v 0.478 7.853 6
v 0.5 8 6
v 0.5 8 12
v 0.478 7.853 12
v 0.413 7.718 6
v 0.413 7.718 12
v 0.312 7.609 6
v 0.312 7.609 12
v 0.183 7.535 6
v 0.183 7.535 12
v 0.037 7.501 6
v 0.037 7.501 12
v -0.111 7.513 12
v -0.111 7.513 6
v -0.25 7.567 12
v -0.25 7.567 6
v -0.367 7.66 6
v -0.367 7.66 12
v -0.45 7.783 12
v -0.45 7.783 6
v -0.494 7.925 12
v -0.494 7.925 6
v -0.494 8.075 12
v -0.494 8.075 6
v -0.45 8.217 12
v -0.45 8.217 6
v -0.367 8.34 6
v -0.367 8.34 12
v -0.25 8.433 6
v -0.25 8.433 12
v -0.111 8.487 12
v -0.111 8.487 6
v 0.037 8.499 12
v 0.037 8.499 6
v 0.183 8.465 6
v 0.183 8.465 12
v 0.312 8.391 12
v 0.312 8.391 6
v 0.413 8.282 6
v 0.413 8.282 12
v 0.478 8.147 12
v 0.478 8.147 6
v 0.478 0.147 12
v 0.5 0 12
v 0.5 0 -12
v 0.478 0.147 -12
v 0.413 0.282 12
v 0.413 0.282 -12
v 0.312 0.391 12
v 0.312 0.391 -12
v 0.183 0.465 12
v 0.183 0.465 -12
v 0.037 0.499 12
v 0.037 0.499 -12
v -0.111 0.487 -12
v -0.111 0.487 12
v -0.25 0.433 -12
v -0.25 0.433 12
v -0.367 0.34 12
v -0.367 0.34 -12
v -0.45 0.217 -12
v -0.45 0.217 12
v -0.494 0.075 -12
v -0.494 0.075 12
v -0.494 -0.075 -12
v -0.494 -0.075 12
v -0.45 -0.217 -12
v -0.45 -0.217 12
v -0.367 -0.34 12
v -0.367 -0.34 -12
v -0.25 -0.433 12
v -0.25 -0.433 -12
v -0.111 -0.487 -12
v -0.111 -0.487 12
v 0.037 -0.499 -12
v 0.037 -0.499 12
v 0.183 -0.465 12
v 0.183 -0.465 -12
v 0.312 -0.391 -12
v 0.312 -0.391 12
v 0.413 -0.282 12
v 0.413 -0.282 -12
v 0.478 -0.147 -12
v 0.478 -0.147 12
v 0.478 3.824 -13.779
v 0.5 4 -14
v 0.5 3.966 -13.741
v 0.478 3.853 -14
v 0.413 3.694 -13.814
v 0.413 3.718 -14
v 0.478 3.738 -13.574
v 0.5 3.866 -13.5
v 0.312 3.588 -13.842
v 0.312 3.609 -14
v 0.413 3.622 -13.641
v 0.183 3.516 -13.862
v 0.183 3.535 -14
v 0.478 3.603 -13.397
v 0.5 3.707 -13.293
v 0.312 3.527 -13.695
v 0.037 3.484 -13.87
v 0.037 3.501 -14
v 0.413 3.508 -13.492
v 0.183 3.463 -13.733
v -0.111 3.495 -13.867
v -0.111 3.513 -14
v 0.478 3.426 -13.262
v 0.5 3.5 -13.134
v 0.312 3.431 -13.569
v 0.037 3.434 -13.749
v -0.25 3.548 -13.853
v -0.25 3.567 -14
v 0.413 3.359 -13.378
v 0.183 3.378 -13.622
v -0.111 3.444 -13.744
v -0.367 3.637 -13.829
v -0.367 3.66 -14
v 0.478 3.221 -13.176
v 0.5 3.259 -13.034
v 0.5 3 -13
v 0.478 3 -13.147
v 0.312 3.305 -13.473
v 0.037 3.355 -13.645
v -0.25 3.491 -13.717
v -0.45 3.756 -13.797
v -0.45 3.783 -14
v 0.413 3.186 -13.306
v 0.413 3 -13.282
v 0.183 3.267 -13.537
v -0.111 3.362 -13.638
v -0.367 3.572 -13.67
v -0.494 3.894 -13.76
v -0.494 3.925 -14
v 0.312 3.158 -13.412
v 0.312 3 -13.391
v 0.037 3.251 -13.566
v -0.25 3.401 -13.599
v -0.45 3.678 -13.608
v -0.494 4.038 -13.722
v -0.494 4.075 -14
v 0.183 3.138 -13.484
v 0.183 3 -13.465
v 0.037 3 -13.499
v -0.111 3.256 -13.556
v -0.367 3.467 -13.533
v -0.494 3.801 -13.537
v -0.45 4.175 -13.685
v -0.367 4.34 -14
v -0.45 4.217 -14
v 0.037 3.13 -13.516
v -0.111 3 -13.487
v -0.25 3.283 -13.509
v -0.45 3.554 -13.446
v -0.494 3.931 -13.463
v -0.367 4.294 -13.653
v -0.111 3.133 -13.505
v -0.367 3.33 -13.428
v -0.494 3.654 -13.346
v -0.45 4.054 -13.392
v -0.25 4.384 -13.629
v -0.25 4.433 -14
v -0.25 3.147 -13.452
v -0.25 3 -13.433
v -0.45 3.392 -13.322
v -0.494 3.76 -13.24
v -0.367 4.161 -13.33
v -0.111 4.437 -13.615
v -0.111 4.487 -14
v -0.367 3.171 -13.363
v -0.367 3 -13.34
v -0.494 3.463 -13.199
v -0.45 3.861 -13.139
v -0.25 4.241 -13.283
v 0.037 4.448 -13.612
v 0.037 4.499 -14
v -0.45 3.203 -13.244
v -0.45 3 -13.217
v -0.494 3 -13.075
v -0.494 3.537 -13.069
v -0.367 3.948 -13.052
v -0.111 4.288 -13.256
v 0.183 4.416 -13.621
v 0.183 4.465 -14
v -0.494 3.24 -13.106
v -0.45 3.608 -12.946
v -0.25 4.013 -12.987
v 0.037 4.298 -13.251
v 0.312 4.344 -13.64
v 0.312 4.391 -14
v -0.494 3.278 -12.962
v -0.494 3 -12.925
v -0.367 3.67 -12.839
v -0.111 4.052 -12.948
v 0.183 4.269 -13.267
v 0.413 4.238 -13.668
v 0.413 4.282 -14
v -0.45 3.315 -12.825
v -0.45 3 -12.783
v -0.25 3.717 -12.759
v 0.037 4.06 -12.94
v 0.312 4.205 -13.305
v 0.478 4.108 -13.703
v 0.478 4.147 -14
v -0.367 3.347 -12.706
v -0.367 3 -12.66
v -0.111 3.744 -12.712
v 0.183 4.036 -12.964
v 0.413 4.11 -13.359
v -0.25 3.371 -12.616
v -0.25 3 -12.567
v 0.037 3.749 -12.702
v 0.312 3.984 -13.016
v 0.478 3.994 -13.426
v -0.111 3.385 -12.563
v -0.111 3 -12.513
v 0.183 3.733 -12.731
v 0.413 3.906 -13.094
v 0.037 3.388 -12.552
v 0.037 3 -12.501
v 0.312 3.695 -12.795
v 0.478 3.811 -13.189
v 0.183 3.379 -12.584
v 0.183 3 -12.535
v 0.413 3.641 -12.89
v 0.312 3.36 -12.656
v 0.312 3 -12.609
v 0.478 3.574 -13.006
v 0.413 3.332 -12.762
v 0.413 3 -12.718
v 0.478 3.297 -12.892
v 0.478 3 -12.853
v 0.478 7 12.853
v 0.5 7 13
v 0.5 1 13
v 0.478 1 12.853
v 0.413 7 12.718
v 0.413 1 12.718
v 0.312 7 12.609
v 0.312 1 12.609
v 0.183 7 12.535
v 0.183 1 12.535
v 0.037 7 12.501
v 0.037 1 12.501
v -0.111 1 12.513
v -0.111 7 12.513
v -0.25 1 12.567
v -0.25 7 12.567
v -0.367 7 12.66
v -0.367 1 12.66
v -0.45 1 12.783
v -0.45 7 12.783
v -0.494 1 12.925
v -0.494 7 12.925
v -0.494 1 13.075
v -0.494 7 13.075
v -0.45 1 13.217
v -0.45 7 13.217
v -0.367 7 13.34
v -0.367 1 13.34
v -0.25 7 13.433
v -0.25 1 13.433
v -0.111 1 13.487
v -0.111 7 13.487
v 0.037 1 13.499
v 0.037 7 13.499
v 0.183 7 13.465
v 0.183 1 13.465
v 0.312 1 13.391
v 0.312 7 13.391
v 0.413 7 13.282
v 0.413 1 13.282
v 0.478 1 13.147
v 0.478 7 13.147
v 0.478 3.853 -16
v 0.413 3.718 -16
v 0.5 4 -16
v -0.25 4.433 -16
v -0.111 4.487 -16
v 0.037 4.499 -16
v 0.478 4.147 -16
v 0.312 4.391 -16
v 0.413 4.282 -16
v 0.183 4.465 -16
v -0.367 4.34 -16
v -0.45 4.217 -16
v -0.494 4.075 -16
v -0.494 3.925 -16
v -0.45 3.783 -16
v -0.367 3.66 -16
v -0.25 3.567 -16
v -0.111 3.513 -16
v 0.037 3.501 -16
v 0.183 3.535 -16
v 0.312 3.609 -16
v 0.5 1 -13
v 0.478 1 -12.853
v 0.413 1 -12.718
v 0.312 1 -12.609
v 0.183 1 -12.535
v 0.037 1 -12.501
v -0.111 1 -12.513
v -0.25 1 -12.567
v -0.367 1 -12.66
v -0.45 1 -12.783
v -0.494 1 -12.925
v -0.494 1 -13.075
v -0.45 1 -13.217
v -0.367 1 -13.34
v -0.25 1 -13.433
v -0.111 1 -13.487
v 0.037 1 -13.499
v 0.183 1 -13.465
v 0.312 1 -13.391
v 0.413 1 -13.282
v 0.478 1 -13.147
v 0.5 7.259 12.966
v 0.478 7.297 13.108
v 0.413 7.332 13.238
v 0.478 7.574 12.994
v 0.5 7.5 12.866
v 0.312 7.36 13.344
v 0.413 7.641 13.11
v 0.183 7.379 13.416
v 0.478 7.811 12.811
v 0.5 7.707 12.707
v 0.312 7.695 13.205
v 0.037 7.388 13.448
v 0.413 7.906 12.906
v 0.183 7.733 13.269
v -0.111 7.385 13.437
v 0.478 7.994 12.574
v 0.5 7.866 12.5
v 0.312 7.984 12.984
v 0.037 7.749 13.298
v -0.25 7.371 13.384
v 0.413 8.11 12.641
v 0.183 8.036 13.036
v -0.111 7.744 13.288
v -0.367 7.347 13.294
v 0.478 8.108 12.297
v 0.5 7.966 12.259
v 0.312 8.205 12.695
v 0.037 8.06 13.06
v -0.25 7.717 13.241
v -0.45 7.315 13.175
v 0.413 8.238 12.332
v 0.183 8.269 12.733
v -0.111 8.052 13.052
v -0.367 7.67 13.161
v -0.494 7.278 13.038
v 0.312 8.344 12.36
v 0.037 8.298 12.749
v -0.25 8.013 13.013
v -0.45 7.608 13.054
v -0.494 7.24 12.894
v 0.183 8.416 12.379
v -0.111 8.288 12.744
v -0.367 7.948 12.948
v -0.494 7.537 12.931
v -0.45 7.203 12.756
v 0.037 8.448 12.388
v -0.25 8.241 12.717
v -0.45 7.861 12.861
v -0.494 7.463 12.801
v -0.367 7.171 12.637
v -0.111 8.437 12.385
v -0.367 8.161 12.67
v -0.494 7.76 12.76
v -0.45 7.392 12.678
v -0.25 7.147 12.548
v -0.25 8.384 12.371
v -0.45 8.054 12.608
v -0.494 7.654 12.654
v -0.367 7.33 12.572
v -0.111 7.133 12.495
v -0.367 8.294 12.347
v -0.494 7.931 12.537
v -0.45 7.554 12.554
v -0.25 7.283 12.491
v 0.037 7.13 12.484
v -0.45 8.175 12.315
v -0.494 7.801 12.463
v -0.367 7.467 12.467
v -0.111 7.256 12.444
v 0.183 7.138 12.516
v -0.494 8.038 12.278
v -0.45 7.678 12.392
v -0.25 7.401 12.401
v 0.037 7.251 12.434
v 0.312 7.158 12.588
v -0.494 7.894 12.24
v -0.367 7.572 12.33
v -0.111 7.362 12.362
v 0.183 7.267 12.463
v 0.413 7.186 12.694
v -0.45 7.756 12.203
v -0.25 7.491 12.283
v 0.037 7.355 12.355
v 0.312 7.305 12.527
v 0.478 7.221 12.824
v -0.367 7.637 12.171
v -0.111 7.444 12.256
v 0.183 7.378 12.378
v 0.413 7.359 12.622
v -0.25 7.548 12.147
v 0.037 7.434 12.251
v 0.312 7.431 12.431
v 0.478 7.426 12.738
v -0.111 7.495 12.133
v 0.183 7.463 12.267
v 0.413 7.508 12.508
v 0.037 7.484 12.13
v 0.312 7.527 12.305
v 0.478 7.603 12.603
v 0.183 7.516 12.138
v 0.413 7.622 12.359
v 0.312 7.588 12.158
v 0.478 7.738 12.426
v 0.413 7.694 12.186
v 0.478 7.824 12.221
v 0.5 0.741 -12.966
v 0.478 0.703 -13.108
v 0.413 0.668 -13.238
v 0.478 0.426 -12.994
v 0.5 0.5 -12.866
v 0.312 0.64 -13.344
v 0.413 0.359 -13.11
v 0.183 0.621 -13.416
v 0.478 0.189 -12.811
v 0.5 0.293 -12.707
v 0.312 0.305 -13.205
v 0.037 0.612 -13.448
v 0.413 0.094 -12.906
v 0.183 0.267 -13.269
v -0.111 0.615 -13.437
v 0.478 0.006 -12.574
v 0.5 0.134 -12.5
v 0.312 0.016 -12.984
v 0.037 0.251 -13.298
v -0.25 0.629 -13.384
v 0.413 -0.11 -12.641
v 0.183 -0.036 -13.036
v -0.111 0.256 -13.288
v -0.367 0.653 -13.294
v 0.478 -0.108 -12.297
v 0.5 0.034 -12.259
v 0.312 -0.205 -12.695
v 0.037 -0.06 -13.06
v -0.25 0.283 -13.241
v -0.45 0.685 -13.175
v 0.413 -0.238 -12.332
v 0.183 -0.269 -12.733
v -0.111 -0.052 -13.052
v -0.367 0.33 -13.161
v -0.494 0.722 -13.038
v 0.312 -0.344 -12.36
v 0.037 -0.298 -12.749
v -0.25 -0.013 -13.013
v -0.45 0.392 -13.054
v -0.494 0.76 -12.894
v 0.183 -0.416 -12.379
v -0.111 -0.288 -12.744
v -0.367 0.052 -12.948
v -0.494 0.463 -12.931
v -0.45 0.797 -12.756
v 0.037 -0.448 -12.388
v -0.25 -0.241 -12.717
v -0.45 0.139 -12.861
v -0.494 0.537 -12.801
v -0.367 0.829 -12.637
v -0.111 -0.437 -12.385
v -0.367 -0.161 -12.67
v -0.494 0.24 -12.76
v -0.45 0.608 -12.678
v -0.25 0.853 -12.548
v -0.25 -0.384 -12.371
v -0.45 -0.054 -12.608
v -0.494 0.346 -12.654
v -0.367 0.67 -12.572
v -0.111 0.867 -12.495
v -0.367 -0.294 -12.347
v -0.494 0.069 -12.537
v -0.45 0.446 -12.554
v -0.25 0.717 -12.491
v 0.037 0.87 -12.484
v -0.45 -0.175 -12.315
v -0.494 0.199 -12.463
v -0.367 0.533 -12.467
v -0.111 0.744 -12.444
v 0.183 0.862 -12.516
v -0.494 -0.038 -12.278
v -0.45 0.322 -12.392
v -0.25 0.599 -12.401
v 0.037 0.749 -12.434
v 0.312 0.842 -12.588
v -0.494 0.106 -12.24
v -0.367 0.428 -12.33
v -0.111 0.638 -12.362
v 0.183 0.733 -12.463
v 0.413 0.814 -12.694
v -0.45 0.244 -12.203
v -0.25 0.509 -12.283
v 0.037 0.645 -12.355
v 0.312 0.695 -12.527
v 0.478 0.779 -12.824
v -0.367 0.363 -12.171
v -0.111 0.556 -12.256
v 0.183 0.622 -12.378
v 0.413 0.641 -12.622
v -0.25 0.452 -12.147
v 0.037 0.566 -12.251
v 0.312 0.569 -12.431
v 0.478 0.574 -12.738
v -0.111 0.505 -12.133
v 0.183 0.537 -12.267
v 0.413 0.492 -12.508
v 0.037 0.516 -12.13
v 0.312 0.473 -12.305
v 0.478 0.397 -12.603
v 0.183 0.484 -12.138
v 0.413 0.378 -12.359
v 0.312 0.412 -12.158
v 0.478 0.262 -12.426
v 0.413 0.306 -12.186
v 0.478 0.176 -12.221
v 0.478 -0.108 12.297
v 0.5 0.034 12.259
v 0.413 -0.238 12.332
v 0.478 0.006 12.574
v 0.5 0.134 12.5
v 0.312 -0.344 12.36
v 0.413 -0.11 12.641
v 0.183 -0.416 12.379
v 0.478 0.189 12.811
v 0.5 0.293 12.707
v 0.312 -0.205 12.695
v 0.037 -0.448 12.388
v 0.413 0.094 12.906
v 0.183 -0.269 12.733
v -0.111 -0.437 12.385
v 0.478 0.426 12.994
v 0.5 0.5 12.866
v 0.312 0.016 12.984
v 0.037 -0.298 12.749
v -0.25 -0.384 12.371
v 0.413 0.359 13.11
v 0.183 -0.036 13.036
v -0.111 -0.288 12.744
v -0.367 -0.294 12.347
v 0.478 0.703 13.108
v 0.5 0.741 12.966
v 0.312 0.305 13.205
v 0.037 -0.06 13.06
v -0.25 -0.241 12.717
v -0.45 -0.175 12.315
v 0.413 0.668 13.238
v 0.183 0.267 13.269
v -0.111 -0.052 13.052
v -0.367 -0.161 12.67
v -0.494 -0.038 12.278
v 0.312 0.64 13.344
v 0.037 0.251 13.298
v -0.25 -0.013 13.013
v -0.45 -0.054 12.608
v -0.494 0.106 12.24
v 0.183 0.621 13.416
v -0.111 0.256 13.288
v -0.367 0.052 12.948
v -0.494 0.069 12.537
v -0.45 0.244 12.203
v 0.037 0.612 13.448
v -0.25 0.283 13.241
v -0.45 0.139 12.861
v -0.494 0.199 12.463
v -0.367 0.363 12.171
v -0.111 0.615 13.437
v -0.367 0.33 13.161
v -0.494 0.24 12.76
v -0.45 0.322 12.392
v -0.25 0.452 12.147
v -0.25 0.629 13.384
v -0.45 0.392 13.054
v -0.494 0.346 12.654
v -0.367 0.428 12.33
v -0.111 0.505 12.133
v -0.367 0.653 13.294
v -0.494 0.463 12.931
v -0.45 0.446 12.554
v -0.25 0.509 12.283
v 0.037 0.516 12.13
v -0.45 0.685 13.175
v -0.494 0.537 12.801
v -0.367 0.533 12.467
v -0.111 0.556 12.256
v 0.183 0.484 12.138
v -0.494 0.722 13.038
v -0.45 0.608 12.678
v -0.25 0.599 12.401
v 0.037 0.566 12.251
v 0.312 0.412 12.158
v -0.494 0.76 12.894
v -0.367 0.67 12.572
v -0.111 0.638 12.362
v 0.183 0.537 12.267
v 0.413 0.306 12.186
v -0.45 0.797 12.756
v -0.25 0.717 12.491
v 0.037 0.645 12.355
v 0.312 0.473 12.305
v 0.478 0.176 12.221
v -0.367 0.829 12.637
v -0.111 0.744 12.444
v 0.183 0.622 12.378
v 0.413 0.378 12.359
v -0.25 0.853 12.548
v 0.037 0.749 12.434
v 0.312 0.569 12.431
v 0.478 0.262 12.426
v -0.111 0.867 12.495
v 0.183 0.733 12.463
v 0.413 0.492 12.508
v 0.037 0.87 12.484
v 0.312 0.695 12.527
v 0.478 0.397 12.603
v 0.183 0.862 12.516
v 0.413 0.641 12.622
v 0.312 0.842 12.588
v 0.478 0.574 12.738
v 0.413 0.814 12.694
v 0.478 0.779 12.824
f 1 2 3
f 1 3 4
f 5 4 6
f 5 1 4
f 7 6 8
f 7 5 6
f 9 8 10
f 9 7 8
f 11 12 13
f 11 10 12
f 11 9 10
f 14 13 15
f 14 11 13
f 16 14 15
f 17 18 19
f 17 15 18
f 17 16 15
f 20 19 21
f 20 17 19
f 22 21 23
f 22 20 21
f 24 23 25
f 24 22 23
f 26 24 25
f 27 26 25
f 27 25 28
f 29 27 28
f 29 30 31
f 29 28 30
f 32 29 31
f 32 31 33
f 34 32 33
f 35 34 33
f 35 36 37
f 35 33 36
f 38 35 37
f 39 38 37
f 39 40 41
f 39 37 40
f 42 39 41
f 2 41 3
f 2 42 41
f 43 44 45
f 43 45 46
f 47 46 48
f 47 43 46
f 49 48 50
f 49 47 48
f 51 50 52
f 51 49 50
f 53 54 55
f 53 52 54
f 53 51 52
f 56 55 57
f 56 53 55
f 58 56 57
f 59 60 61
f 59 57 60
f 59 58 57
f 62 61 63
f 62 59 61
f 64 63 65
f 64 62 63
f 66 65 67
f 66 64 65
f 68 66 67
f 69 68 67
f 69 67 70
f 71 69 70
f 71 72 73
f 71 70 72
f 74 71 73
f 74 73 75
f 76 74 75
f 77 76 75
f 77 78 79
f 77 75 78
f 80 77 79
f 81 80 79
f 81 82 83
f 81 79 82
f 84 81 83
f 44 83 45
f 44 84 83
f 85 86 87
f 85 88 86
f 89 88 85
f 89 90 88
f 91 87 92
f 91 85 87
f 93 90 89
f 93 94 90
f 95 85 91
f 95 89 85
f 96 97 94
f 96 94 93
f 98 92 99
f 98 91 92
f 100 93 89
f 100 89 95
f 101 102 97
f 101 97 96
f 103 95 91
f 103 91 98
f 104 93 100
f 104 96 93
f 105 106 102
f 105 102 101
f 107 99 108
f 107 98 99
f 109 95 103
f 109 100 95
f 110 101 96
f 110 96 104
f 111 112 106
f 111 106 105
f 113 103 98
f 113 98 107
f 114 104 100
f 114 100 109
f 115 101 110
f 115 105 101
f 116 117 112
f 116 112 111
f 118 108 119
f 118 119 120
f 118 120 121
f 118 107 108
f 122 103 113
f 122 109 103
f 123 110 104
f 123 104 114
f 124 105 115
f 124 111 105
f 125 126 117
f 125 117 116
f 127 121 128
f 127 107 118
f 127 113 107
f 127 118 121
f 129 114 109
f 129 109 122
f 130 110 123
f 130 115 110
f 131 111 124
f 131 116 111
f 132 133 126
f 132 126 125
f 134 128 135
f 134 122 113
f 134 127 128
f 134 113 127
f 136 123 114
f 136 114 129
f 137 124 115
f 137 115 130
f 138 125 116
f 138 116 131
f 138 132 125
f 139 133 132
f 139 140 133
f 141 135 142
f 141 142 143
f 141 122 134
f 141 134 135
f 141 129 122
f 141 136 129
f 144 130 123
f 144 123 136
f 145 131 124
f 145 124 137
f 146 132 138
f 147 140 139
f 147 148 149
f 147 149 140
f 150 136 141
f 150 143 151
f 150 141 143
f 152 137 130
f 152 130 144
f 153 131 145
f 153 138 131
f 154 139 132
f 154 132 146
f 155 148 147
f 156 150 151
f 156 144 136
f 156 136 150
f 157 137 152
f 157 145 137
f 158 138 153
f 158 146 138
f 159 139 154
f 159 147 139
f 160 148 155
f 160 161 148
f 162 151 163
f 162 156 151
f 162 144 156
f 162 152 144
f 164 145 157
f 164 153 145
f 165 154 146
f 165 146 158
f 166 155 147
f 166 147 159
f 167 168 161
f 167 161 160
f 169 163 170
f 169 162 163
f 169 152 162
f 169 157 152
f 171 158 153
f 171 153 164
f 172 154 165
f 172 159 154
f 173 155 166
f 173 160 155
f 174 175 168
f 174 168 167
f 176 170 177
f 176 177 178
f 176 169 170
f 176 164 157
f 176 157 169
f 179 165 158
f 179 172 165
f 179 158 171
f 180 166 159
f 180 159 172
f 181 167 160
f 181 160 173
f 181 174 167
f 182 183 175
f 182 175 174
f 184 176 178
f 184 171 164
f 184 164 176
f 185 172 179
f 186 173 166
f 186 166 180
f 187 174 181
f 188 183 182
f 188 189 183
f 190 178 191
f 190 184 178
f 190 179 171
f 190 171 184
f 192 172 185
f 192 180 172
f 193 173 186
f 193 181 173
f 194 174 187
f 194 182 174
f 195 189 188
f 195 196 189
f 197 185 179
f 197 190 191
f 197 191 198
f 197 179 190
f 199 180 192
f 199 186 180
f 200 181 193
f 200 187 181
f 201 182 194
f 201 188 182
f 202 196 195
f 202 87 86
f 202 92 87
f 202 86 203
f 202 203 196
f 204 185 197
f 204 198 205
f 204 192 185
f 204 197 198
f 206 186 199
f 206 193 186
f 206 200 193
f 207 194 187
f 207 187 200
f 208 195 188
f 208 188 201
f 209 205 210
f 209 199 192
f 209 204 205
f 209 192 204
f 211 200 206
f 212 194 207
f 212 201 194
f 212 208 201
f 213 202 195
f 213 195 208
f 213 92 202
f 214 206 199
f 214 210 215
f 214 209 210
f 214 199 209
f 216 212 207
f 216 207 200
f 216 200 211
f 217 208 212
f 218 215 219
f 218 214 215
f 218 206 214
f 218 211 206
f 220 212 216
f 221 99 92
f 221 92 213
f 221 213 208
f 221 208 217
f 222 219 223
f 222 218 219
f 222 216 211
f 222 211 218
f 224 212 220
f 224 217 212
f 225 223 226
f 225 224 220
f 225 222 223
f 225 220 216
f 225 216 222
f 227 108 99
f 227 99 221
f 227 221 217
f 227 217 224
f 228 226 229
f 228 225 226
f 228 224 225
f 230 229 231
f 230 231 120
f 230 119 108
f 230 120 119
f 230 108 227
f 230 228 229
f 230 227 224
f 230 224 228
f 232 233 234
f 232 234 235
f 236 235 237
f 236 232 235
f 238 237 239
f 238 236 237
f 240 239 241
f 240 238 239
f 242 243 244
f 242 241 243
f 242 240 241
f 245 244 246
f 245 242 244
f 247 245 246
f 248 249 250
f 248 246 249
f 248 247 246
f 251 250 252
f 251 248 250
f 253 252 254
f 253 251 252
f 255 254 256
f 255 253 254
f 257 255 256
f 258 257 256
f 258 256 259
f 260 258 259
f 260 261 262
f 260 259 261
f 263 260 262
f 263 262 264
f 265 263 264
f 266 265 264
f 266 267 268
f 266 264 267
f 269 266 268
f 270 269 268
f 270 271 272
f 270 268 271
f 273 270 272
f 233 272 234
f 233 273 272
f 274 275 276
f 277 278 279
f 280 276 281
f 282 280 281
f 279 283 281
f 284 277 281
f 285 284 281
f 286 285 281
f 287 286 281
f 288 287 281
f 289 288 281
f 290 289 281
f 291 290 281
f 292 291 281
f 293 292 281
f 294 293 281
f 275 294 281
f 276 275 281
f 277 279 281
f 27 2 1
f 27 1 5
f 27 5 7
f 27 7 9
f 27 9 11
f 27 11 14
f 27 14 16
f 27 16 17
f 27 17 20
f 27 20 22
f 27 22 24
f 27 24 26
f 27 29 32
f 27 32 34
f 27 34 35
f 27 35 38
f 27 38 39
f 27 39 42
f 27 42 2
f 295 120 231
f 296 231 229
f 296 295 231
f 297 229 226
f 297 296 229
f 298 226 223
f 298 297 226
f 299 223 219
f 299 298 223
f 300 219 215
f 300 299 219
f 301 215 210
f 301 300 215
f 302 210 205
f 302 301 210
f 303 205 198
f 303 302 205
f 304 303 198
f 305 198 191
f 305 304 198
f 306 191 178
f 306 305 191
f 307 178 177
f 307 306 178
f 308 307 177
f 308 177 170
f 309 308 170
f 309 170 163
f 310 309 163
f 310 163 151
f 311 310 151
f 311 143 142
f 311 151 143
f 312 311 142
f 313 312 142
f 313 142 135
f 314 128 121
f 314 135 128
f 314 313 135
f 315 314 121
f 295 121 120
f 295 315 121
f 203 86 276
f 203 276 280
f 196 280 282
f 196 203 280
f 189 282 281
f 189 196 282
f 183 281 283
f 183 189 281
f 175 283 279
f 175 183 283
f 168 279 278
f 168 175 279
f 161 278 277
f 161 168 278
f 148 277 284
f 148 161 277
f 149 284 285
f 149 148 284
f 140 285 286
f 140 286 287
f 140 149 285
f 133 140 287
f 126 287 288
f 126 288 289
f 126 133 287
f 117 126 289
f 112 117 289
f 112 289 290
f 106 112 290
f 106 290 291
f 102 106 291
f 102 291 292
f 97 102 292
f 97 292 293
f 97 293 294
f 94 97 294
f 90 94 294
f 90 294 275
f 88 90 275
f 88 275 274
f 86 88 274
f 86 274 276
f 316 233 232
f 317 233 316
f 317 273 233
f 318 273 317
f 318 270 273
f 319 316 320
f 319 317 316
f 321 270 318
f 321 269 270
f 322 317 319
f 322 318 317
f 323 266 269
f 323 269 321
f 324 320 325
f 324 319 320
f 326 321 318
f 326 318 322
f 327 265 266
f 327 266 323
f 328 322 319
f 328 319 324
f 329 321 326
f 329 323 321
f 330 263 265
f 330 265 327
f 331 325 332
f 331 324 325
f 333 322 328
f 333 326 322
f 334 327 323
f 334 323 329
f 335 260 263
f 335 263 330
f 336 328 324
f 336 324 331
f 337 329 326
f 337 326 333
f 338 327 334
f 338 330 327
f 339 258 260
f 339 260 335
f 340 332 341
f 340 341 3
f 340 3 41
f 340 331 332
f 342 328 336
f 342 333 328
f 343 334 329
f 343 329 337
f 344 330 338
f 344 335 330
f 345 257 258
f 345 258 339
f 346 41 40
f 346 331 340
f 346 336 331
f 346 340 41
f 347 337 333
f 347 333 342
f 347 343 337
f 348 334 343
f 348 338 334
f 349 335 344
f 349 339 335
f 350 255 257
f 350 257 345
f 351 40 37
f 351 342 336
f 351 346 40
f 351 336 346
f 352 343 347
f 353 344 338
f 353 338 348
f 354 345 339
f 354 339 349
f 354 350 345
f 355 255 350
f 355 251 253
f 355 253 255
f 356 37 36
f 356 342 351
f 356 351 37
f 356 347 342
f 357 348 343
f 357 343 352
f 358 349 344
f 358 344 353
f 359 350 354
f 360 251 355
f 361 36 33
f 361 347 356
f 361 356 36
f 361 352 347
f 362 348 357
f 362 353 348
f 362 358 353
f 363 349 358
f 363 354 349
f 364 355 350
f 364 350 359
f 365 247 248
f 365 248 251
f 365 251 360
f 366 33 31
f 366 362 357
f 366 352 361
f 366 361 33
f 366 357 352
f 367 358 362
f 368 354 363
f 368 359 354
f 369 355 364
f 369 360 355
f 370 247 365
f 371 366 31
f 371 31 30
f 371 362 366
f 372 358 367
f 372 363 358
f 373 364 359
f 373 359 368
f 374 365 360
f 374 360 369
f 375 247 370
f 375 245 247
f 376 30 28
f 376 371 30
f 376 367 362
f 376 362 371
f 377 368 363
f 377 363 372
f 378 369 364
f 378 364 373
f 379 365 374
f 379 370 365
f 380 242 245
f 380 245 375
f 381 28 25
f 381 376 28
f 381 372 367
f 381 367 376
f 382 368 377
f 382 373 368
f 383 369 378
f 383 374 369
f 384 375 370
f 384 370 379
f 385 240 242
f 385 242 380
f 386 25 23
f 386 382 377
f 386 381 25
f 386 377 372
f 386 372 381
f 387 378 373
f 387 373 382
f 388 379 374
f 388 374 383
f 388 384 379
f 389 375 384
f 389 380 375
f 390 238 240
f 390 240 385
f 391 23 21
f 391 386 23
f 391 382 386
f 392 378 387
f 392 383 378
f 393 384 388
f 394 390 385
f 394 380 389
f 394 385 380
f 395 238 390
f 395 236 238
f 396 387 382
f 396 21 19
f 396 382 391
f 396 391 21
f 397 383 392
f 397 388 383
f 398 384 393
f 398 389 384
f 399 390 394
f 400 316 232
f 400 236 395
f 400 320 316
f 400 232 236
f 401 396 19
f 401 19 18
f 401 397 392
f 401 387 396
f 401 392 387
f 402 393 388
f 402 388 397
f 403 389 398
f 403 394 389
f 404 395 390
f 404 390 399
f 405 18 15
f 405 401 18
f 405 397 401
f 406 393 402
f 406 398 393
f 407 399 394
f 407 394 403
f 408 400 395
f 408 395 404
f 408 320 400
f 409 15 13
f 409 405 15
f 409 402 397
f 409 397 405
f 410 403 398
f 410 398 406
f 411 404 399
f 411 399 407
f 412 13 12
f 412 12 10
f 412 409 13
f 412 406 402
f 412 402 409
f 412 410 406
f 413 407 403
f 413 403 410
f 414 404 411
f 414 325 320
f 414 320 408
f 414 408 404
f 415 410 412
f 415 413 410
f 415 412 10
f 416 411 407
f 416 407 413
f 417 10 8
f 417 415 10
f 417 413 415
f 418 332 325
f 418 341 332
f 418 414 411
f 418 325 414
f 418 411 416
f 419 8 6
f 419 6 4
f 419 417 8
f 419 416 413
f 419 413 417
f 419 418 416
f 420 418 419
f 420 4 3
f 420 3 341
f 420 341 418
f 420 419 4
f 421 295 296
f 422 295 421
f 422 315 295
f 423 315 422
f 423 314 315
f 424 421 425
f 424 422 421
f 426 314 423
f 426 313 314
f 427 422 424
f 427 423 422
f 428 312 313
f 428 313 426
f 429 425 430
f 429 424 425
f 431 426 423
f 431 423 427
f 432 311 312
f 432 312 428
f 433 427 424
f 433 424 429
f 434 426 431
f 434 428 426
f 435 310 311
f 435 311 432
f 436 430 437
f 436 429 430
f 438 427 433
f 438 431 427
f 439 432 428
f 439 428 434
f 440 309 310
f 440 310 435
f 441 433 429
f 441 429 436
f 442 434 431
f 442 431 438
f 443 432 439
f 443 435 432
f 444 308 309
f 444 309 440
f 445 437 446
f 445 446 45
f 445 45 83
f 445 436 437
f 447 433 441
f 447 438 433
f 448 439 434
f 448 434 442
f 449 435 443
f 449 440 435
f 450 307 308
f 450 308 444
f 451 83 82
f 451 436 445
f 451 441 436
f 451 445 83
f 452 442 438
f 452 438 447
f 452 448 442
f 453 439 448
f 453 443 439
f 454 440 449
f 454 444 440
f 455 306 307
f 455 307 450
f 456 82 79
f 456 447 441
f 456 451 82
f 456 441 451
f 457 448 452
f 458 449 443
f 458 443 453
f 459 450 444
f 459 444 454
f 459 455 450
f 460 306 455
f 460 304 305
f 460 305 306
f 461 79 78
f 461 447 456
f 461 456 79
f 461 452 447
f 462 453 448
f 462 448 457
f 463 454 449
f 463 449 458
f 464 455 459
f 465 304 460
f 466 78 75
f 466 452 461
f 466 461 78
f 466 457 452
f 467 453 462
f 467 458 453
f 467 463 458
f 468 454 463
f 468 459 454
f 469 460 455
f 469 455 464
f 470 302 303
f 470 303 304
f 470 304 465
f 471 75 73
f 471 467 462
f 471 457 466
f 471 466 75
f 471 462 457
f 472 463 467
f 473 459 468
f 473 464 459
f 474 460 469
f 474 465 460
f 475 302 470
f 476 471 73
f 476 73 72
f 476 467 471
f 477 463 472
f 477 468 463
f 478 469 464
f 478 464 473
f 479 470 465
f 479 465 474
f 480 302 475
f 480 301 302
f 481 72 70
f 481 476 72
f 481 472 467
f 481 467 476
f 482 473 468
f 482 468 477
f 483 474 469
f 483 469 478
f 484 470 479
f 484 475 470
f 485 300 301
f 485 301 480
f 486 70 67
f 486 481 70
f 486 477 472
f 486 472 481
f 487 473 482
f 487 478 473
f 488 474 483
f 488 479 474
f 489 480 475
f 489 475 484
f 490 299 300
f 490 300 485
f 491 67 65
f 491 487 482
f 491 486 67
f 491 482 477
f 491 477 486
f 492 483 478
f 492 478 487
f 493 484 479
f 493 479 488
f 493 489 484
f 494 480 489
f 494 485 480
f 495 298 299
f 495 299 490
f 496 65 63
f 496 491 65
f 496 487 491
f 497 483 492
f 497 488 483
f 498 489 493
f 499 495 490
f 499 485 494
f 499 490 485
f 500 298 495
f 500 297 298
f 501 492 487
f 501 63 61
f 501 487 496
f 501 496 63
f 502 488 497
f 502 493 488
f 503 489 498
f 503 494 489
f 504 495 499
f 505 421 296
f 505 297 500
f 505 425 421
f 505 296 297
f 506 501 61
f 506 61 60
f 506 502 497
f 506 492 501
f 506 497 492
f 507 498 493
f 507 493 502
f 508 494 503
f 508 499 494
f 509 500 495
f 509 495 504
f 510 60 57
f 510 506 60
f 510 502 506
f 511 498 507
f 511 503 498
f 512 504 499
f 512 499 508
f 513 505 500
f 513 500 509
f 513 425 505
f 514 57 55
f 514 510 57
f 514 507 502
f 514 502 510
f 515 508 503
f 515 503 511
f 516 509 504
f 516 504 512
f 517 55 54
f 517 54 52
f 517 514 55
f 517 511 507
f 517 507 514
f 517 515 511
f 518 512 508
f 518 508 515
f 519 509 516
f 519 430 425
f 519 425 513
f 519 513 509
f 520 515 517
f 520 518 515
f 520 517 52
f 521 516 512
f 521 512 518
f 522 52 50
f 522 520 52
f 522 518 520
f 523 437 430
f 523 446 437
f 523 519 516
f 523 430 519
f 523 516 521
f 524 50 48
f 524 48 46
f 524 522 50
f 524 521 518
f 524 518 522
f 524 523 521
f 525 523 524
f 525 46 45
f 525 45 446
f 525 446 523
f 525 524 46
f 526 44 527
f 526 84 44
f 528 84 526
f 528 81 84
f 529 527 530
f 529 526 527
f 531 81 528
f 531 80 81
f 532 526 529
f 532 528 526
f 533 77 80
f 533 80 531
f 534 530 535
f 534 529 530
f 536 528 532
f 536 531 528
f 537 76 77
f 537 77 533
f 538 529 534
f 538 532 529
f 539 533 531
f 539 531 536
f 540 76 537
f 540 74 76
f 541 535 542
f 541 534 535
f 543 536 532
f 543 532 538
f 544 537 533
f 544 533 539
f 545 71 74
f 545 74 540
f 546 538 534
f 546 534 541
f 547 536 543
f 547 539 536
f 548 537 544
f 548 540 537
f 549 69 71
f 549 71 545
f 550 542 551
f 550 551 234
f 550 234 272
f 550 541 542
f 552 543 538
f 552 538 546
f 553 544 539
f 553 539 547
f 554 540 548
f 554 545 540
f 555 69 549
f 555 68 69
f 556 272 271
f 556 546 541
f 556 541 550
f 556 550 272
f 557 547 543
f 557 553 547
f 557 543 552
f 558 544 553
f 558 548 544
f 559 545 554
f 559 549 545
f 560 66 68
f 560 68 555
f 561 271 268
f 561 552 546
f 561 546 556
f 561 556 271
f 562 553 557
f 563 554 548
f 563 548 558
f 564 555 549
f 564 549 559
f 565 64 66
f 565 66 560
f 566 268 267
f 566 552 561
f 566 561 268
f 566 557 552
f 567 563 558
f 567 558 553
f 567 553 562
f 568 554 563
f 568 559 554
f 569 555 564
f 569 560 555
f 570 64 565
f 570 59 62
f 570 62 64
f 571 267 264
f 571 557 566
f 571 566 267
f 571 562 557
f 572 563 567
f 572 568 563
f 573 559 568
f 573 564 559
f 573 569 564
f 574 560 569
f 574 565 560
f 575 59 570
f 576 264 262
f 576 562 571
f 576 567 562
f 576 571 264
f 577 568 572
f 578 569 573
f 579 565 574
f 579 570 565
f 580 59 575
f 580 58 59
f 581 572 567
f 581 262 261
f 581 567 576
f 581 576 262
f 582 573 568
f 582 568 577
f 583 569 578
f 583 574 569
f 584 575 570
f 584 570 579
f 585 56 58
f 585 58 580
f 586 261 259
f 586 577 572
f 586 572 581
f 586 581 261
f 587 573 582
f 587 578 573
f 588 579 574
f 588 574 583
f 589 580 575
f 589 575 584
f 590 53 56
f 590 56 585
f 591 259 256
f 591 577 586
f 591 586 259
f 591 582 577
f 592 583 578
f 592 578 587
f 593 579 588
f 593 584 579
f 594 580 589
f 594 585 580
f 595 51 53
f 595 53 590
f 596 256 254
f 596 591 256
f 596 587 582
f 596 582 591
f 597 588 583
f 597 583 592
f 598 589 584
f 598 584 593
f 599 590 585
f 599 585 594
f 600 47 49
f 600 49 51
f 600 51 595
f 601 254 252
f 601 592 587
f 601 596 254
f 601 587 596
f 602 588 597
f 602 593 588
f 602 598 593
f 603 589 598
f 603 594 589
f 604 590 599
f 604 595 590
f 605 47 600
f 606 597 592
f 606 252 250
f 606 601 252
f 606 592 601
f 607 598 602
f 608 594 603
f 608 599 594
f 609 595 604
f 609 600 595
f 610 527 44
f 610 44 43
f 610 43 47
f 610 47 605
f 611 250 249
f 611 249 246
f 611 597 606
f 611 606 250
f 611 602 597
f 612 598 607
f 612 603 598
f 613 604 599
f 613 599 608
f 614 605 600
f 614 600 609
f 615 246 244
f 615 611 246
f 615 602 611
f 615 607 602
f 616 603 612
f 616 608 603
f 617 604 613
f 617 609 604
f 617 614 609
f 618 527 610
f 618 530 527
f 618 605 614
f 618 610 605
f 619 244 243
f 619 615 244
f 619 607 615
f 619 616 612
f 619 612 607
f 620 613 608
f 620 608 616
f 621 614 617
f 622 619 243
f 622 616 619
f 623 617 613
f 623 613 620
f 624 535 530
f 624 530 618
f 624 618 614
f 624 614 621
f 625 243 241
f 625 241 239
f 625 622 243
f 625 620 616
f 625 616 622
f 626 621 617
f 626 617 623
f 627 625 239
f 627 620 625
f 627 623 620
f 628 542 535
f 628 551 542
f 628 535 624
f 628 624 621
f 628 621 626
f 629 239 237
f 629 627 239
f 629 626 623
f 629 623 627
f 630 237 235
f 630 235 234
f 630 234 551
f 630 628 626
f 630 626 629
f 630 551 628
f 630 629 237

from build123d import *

# Parameters (mm, degrees)
SKETCH3_R = 0.5


with BuildPart() as part:
    # Sweep2: sweep along a path in Sketch1
    with BuildLine(Plane(origin=(0, 0, 0), x_dir=(0, 0, -1), z_dir=(1, 0, 0))) as sweep2_path:
        Line((16, 4), (14, 4))
        ThreePointArc((14, 4), (13.292893219, 3.707106781), (13, 3))
        Line((13, 3), (13, 1))
        ThreePointArc((13, 1), (12.707106781, 0.292893219), (12, 0))
        Line((12, 0), (-12, 0))
        ThreePointArc((-12, 0), (-12.707106781, 0.292893219), (-13, 1))
        Line((-13, 1), (-13, 7))
        ThreePointArc((-13, 7), (-12.707106781, 7.707106781), (-12, 8))
        Line((-12, 8), (-6, 8))
    # Sketch3 → Sweep2 (sweep)
    with BuildSketch(Plane.XY):
        Circle(SKETCH3_R)
    sweep(path=sweep2_path.line)


solid = part.part
